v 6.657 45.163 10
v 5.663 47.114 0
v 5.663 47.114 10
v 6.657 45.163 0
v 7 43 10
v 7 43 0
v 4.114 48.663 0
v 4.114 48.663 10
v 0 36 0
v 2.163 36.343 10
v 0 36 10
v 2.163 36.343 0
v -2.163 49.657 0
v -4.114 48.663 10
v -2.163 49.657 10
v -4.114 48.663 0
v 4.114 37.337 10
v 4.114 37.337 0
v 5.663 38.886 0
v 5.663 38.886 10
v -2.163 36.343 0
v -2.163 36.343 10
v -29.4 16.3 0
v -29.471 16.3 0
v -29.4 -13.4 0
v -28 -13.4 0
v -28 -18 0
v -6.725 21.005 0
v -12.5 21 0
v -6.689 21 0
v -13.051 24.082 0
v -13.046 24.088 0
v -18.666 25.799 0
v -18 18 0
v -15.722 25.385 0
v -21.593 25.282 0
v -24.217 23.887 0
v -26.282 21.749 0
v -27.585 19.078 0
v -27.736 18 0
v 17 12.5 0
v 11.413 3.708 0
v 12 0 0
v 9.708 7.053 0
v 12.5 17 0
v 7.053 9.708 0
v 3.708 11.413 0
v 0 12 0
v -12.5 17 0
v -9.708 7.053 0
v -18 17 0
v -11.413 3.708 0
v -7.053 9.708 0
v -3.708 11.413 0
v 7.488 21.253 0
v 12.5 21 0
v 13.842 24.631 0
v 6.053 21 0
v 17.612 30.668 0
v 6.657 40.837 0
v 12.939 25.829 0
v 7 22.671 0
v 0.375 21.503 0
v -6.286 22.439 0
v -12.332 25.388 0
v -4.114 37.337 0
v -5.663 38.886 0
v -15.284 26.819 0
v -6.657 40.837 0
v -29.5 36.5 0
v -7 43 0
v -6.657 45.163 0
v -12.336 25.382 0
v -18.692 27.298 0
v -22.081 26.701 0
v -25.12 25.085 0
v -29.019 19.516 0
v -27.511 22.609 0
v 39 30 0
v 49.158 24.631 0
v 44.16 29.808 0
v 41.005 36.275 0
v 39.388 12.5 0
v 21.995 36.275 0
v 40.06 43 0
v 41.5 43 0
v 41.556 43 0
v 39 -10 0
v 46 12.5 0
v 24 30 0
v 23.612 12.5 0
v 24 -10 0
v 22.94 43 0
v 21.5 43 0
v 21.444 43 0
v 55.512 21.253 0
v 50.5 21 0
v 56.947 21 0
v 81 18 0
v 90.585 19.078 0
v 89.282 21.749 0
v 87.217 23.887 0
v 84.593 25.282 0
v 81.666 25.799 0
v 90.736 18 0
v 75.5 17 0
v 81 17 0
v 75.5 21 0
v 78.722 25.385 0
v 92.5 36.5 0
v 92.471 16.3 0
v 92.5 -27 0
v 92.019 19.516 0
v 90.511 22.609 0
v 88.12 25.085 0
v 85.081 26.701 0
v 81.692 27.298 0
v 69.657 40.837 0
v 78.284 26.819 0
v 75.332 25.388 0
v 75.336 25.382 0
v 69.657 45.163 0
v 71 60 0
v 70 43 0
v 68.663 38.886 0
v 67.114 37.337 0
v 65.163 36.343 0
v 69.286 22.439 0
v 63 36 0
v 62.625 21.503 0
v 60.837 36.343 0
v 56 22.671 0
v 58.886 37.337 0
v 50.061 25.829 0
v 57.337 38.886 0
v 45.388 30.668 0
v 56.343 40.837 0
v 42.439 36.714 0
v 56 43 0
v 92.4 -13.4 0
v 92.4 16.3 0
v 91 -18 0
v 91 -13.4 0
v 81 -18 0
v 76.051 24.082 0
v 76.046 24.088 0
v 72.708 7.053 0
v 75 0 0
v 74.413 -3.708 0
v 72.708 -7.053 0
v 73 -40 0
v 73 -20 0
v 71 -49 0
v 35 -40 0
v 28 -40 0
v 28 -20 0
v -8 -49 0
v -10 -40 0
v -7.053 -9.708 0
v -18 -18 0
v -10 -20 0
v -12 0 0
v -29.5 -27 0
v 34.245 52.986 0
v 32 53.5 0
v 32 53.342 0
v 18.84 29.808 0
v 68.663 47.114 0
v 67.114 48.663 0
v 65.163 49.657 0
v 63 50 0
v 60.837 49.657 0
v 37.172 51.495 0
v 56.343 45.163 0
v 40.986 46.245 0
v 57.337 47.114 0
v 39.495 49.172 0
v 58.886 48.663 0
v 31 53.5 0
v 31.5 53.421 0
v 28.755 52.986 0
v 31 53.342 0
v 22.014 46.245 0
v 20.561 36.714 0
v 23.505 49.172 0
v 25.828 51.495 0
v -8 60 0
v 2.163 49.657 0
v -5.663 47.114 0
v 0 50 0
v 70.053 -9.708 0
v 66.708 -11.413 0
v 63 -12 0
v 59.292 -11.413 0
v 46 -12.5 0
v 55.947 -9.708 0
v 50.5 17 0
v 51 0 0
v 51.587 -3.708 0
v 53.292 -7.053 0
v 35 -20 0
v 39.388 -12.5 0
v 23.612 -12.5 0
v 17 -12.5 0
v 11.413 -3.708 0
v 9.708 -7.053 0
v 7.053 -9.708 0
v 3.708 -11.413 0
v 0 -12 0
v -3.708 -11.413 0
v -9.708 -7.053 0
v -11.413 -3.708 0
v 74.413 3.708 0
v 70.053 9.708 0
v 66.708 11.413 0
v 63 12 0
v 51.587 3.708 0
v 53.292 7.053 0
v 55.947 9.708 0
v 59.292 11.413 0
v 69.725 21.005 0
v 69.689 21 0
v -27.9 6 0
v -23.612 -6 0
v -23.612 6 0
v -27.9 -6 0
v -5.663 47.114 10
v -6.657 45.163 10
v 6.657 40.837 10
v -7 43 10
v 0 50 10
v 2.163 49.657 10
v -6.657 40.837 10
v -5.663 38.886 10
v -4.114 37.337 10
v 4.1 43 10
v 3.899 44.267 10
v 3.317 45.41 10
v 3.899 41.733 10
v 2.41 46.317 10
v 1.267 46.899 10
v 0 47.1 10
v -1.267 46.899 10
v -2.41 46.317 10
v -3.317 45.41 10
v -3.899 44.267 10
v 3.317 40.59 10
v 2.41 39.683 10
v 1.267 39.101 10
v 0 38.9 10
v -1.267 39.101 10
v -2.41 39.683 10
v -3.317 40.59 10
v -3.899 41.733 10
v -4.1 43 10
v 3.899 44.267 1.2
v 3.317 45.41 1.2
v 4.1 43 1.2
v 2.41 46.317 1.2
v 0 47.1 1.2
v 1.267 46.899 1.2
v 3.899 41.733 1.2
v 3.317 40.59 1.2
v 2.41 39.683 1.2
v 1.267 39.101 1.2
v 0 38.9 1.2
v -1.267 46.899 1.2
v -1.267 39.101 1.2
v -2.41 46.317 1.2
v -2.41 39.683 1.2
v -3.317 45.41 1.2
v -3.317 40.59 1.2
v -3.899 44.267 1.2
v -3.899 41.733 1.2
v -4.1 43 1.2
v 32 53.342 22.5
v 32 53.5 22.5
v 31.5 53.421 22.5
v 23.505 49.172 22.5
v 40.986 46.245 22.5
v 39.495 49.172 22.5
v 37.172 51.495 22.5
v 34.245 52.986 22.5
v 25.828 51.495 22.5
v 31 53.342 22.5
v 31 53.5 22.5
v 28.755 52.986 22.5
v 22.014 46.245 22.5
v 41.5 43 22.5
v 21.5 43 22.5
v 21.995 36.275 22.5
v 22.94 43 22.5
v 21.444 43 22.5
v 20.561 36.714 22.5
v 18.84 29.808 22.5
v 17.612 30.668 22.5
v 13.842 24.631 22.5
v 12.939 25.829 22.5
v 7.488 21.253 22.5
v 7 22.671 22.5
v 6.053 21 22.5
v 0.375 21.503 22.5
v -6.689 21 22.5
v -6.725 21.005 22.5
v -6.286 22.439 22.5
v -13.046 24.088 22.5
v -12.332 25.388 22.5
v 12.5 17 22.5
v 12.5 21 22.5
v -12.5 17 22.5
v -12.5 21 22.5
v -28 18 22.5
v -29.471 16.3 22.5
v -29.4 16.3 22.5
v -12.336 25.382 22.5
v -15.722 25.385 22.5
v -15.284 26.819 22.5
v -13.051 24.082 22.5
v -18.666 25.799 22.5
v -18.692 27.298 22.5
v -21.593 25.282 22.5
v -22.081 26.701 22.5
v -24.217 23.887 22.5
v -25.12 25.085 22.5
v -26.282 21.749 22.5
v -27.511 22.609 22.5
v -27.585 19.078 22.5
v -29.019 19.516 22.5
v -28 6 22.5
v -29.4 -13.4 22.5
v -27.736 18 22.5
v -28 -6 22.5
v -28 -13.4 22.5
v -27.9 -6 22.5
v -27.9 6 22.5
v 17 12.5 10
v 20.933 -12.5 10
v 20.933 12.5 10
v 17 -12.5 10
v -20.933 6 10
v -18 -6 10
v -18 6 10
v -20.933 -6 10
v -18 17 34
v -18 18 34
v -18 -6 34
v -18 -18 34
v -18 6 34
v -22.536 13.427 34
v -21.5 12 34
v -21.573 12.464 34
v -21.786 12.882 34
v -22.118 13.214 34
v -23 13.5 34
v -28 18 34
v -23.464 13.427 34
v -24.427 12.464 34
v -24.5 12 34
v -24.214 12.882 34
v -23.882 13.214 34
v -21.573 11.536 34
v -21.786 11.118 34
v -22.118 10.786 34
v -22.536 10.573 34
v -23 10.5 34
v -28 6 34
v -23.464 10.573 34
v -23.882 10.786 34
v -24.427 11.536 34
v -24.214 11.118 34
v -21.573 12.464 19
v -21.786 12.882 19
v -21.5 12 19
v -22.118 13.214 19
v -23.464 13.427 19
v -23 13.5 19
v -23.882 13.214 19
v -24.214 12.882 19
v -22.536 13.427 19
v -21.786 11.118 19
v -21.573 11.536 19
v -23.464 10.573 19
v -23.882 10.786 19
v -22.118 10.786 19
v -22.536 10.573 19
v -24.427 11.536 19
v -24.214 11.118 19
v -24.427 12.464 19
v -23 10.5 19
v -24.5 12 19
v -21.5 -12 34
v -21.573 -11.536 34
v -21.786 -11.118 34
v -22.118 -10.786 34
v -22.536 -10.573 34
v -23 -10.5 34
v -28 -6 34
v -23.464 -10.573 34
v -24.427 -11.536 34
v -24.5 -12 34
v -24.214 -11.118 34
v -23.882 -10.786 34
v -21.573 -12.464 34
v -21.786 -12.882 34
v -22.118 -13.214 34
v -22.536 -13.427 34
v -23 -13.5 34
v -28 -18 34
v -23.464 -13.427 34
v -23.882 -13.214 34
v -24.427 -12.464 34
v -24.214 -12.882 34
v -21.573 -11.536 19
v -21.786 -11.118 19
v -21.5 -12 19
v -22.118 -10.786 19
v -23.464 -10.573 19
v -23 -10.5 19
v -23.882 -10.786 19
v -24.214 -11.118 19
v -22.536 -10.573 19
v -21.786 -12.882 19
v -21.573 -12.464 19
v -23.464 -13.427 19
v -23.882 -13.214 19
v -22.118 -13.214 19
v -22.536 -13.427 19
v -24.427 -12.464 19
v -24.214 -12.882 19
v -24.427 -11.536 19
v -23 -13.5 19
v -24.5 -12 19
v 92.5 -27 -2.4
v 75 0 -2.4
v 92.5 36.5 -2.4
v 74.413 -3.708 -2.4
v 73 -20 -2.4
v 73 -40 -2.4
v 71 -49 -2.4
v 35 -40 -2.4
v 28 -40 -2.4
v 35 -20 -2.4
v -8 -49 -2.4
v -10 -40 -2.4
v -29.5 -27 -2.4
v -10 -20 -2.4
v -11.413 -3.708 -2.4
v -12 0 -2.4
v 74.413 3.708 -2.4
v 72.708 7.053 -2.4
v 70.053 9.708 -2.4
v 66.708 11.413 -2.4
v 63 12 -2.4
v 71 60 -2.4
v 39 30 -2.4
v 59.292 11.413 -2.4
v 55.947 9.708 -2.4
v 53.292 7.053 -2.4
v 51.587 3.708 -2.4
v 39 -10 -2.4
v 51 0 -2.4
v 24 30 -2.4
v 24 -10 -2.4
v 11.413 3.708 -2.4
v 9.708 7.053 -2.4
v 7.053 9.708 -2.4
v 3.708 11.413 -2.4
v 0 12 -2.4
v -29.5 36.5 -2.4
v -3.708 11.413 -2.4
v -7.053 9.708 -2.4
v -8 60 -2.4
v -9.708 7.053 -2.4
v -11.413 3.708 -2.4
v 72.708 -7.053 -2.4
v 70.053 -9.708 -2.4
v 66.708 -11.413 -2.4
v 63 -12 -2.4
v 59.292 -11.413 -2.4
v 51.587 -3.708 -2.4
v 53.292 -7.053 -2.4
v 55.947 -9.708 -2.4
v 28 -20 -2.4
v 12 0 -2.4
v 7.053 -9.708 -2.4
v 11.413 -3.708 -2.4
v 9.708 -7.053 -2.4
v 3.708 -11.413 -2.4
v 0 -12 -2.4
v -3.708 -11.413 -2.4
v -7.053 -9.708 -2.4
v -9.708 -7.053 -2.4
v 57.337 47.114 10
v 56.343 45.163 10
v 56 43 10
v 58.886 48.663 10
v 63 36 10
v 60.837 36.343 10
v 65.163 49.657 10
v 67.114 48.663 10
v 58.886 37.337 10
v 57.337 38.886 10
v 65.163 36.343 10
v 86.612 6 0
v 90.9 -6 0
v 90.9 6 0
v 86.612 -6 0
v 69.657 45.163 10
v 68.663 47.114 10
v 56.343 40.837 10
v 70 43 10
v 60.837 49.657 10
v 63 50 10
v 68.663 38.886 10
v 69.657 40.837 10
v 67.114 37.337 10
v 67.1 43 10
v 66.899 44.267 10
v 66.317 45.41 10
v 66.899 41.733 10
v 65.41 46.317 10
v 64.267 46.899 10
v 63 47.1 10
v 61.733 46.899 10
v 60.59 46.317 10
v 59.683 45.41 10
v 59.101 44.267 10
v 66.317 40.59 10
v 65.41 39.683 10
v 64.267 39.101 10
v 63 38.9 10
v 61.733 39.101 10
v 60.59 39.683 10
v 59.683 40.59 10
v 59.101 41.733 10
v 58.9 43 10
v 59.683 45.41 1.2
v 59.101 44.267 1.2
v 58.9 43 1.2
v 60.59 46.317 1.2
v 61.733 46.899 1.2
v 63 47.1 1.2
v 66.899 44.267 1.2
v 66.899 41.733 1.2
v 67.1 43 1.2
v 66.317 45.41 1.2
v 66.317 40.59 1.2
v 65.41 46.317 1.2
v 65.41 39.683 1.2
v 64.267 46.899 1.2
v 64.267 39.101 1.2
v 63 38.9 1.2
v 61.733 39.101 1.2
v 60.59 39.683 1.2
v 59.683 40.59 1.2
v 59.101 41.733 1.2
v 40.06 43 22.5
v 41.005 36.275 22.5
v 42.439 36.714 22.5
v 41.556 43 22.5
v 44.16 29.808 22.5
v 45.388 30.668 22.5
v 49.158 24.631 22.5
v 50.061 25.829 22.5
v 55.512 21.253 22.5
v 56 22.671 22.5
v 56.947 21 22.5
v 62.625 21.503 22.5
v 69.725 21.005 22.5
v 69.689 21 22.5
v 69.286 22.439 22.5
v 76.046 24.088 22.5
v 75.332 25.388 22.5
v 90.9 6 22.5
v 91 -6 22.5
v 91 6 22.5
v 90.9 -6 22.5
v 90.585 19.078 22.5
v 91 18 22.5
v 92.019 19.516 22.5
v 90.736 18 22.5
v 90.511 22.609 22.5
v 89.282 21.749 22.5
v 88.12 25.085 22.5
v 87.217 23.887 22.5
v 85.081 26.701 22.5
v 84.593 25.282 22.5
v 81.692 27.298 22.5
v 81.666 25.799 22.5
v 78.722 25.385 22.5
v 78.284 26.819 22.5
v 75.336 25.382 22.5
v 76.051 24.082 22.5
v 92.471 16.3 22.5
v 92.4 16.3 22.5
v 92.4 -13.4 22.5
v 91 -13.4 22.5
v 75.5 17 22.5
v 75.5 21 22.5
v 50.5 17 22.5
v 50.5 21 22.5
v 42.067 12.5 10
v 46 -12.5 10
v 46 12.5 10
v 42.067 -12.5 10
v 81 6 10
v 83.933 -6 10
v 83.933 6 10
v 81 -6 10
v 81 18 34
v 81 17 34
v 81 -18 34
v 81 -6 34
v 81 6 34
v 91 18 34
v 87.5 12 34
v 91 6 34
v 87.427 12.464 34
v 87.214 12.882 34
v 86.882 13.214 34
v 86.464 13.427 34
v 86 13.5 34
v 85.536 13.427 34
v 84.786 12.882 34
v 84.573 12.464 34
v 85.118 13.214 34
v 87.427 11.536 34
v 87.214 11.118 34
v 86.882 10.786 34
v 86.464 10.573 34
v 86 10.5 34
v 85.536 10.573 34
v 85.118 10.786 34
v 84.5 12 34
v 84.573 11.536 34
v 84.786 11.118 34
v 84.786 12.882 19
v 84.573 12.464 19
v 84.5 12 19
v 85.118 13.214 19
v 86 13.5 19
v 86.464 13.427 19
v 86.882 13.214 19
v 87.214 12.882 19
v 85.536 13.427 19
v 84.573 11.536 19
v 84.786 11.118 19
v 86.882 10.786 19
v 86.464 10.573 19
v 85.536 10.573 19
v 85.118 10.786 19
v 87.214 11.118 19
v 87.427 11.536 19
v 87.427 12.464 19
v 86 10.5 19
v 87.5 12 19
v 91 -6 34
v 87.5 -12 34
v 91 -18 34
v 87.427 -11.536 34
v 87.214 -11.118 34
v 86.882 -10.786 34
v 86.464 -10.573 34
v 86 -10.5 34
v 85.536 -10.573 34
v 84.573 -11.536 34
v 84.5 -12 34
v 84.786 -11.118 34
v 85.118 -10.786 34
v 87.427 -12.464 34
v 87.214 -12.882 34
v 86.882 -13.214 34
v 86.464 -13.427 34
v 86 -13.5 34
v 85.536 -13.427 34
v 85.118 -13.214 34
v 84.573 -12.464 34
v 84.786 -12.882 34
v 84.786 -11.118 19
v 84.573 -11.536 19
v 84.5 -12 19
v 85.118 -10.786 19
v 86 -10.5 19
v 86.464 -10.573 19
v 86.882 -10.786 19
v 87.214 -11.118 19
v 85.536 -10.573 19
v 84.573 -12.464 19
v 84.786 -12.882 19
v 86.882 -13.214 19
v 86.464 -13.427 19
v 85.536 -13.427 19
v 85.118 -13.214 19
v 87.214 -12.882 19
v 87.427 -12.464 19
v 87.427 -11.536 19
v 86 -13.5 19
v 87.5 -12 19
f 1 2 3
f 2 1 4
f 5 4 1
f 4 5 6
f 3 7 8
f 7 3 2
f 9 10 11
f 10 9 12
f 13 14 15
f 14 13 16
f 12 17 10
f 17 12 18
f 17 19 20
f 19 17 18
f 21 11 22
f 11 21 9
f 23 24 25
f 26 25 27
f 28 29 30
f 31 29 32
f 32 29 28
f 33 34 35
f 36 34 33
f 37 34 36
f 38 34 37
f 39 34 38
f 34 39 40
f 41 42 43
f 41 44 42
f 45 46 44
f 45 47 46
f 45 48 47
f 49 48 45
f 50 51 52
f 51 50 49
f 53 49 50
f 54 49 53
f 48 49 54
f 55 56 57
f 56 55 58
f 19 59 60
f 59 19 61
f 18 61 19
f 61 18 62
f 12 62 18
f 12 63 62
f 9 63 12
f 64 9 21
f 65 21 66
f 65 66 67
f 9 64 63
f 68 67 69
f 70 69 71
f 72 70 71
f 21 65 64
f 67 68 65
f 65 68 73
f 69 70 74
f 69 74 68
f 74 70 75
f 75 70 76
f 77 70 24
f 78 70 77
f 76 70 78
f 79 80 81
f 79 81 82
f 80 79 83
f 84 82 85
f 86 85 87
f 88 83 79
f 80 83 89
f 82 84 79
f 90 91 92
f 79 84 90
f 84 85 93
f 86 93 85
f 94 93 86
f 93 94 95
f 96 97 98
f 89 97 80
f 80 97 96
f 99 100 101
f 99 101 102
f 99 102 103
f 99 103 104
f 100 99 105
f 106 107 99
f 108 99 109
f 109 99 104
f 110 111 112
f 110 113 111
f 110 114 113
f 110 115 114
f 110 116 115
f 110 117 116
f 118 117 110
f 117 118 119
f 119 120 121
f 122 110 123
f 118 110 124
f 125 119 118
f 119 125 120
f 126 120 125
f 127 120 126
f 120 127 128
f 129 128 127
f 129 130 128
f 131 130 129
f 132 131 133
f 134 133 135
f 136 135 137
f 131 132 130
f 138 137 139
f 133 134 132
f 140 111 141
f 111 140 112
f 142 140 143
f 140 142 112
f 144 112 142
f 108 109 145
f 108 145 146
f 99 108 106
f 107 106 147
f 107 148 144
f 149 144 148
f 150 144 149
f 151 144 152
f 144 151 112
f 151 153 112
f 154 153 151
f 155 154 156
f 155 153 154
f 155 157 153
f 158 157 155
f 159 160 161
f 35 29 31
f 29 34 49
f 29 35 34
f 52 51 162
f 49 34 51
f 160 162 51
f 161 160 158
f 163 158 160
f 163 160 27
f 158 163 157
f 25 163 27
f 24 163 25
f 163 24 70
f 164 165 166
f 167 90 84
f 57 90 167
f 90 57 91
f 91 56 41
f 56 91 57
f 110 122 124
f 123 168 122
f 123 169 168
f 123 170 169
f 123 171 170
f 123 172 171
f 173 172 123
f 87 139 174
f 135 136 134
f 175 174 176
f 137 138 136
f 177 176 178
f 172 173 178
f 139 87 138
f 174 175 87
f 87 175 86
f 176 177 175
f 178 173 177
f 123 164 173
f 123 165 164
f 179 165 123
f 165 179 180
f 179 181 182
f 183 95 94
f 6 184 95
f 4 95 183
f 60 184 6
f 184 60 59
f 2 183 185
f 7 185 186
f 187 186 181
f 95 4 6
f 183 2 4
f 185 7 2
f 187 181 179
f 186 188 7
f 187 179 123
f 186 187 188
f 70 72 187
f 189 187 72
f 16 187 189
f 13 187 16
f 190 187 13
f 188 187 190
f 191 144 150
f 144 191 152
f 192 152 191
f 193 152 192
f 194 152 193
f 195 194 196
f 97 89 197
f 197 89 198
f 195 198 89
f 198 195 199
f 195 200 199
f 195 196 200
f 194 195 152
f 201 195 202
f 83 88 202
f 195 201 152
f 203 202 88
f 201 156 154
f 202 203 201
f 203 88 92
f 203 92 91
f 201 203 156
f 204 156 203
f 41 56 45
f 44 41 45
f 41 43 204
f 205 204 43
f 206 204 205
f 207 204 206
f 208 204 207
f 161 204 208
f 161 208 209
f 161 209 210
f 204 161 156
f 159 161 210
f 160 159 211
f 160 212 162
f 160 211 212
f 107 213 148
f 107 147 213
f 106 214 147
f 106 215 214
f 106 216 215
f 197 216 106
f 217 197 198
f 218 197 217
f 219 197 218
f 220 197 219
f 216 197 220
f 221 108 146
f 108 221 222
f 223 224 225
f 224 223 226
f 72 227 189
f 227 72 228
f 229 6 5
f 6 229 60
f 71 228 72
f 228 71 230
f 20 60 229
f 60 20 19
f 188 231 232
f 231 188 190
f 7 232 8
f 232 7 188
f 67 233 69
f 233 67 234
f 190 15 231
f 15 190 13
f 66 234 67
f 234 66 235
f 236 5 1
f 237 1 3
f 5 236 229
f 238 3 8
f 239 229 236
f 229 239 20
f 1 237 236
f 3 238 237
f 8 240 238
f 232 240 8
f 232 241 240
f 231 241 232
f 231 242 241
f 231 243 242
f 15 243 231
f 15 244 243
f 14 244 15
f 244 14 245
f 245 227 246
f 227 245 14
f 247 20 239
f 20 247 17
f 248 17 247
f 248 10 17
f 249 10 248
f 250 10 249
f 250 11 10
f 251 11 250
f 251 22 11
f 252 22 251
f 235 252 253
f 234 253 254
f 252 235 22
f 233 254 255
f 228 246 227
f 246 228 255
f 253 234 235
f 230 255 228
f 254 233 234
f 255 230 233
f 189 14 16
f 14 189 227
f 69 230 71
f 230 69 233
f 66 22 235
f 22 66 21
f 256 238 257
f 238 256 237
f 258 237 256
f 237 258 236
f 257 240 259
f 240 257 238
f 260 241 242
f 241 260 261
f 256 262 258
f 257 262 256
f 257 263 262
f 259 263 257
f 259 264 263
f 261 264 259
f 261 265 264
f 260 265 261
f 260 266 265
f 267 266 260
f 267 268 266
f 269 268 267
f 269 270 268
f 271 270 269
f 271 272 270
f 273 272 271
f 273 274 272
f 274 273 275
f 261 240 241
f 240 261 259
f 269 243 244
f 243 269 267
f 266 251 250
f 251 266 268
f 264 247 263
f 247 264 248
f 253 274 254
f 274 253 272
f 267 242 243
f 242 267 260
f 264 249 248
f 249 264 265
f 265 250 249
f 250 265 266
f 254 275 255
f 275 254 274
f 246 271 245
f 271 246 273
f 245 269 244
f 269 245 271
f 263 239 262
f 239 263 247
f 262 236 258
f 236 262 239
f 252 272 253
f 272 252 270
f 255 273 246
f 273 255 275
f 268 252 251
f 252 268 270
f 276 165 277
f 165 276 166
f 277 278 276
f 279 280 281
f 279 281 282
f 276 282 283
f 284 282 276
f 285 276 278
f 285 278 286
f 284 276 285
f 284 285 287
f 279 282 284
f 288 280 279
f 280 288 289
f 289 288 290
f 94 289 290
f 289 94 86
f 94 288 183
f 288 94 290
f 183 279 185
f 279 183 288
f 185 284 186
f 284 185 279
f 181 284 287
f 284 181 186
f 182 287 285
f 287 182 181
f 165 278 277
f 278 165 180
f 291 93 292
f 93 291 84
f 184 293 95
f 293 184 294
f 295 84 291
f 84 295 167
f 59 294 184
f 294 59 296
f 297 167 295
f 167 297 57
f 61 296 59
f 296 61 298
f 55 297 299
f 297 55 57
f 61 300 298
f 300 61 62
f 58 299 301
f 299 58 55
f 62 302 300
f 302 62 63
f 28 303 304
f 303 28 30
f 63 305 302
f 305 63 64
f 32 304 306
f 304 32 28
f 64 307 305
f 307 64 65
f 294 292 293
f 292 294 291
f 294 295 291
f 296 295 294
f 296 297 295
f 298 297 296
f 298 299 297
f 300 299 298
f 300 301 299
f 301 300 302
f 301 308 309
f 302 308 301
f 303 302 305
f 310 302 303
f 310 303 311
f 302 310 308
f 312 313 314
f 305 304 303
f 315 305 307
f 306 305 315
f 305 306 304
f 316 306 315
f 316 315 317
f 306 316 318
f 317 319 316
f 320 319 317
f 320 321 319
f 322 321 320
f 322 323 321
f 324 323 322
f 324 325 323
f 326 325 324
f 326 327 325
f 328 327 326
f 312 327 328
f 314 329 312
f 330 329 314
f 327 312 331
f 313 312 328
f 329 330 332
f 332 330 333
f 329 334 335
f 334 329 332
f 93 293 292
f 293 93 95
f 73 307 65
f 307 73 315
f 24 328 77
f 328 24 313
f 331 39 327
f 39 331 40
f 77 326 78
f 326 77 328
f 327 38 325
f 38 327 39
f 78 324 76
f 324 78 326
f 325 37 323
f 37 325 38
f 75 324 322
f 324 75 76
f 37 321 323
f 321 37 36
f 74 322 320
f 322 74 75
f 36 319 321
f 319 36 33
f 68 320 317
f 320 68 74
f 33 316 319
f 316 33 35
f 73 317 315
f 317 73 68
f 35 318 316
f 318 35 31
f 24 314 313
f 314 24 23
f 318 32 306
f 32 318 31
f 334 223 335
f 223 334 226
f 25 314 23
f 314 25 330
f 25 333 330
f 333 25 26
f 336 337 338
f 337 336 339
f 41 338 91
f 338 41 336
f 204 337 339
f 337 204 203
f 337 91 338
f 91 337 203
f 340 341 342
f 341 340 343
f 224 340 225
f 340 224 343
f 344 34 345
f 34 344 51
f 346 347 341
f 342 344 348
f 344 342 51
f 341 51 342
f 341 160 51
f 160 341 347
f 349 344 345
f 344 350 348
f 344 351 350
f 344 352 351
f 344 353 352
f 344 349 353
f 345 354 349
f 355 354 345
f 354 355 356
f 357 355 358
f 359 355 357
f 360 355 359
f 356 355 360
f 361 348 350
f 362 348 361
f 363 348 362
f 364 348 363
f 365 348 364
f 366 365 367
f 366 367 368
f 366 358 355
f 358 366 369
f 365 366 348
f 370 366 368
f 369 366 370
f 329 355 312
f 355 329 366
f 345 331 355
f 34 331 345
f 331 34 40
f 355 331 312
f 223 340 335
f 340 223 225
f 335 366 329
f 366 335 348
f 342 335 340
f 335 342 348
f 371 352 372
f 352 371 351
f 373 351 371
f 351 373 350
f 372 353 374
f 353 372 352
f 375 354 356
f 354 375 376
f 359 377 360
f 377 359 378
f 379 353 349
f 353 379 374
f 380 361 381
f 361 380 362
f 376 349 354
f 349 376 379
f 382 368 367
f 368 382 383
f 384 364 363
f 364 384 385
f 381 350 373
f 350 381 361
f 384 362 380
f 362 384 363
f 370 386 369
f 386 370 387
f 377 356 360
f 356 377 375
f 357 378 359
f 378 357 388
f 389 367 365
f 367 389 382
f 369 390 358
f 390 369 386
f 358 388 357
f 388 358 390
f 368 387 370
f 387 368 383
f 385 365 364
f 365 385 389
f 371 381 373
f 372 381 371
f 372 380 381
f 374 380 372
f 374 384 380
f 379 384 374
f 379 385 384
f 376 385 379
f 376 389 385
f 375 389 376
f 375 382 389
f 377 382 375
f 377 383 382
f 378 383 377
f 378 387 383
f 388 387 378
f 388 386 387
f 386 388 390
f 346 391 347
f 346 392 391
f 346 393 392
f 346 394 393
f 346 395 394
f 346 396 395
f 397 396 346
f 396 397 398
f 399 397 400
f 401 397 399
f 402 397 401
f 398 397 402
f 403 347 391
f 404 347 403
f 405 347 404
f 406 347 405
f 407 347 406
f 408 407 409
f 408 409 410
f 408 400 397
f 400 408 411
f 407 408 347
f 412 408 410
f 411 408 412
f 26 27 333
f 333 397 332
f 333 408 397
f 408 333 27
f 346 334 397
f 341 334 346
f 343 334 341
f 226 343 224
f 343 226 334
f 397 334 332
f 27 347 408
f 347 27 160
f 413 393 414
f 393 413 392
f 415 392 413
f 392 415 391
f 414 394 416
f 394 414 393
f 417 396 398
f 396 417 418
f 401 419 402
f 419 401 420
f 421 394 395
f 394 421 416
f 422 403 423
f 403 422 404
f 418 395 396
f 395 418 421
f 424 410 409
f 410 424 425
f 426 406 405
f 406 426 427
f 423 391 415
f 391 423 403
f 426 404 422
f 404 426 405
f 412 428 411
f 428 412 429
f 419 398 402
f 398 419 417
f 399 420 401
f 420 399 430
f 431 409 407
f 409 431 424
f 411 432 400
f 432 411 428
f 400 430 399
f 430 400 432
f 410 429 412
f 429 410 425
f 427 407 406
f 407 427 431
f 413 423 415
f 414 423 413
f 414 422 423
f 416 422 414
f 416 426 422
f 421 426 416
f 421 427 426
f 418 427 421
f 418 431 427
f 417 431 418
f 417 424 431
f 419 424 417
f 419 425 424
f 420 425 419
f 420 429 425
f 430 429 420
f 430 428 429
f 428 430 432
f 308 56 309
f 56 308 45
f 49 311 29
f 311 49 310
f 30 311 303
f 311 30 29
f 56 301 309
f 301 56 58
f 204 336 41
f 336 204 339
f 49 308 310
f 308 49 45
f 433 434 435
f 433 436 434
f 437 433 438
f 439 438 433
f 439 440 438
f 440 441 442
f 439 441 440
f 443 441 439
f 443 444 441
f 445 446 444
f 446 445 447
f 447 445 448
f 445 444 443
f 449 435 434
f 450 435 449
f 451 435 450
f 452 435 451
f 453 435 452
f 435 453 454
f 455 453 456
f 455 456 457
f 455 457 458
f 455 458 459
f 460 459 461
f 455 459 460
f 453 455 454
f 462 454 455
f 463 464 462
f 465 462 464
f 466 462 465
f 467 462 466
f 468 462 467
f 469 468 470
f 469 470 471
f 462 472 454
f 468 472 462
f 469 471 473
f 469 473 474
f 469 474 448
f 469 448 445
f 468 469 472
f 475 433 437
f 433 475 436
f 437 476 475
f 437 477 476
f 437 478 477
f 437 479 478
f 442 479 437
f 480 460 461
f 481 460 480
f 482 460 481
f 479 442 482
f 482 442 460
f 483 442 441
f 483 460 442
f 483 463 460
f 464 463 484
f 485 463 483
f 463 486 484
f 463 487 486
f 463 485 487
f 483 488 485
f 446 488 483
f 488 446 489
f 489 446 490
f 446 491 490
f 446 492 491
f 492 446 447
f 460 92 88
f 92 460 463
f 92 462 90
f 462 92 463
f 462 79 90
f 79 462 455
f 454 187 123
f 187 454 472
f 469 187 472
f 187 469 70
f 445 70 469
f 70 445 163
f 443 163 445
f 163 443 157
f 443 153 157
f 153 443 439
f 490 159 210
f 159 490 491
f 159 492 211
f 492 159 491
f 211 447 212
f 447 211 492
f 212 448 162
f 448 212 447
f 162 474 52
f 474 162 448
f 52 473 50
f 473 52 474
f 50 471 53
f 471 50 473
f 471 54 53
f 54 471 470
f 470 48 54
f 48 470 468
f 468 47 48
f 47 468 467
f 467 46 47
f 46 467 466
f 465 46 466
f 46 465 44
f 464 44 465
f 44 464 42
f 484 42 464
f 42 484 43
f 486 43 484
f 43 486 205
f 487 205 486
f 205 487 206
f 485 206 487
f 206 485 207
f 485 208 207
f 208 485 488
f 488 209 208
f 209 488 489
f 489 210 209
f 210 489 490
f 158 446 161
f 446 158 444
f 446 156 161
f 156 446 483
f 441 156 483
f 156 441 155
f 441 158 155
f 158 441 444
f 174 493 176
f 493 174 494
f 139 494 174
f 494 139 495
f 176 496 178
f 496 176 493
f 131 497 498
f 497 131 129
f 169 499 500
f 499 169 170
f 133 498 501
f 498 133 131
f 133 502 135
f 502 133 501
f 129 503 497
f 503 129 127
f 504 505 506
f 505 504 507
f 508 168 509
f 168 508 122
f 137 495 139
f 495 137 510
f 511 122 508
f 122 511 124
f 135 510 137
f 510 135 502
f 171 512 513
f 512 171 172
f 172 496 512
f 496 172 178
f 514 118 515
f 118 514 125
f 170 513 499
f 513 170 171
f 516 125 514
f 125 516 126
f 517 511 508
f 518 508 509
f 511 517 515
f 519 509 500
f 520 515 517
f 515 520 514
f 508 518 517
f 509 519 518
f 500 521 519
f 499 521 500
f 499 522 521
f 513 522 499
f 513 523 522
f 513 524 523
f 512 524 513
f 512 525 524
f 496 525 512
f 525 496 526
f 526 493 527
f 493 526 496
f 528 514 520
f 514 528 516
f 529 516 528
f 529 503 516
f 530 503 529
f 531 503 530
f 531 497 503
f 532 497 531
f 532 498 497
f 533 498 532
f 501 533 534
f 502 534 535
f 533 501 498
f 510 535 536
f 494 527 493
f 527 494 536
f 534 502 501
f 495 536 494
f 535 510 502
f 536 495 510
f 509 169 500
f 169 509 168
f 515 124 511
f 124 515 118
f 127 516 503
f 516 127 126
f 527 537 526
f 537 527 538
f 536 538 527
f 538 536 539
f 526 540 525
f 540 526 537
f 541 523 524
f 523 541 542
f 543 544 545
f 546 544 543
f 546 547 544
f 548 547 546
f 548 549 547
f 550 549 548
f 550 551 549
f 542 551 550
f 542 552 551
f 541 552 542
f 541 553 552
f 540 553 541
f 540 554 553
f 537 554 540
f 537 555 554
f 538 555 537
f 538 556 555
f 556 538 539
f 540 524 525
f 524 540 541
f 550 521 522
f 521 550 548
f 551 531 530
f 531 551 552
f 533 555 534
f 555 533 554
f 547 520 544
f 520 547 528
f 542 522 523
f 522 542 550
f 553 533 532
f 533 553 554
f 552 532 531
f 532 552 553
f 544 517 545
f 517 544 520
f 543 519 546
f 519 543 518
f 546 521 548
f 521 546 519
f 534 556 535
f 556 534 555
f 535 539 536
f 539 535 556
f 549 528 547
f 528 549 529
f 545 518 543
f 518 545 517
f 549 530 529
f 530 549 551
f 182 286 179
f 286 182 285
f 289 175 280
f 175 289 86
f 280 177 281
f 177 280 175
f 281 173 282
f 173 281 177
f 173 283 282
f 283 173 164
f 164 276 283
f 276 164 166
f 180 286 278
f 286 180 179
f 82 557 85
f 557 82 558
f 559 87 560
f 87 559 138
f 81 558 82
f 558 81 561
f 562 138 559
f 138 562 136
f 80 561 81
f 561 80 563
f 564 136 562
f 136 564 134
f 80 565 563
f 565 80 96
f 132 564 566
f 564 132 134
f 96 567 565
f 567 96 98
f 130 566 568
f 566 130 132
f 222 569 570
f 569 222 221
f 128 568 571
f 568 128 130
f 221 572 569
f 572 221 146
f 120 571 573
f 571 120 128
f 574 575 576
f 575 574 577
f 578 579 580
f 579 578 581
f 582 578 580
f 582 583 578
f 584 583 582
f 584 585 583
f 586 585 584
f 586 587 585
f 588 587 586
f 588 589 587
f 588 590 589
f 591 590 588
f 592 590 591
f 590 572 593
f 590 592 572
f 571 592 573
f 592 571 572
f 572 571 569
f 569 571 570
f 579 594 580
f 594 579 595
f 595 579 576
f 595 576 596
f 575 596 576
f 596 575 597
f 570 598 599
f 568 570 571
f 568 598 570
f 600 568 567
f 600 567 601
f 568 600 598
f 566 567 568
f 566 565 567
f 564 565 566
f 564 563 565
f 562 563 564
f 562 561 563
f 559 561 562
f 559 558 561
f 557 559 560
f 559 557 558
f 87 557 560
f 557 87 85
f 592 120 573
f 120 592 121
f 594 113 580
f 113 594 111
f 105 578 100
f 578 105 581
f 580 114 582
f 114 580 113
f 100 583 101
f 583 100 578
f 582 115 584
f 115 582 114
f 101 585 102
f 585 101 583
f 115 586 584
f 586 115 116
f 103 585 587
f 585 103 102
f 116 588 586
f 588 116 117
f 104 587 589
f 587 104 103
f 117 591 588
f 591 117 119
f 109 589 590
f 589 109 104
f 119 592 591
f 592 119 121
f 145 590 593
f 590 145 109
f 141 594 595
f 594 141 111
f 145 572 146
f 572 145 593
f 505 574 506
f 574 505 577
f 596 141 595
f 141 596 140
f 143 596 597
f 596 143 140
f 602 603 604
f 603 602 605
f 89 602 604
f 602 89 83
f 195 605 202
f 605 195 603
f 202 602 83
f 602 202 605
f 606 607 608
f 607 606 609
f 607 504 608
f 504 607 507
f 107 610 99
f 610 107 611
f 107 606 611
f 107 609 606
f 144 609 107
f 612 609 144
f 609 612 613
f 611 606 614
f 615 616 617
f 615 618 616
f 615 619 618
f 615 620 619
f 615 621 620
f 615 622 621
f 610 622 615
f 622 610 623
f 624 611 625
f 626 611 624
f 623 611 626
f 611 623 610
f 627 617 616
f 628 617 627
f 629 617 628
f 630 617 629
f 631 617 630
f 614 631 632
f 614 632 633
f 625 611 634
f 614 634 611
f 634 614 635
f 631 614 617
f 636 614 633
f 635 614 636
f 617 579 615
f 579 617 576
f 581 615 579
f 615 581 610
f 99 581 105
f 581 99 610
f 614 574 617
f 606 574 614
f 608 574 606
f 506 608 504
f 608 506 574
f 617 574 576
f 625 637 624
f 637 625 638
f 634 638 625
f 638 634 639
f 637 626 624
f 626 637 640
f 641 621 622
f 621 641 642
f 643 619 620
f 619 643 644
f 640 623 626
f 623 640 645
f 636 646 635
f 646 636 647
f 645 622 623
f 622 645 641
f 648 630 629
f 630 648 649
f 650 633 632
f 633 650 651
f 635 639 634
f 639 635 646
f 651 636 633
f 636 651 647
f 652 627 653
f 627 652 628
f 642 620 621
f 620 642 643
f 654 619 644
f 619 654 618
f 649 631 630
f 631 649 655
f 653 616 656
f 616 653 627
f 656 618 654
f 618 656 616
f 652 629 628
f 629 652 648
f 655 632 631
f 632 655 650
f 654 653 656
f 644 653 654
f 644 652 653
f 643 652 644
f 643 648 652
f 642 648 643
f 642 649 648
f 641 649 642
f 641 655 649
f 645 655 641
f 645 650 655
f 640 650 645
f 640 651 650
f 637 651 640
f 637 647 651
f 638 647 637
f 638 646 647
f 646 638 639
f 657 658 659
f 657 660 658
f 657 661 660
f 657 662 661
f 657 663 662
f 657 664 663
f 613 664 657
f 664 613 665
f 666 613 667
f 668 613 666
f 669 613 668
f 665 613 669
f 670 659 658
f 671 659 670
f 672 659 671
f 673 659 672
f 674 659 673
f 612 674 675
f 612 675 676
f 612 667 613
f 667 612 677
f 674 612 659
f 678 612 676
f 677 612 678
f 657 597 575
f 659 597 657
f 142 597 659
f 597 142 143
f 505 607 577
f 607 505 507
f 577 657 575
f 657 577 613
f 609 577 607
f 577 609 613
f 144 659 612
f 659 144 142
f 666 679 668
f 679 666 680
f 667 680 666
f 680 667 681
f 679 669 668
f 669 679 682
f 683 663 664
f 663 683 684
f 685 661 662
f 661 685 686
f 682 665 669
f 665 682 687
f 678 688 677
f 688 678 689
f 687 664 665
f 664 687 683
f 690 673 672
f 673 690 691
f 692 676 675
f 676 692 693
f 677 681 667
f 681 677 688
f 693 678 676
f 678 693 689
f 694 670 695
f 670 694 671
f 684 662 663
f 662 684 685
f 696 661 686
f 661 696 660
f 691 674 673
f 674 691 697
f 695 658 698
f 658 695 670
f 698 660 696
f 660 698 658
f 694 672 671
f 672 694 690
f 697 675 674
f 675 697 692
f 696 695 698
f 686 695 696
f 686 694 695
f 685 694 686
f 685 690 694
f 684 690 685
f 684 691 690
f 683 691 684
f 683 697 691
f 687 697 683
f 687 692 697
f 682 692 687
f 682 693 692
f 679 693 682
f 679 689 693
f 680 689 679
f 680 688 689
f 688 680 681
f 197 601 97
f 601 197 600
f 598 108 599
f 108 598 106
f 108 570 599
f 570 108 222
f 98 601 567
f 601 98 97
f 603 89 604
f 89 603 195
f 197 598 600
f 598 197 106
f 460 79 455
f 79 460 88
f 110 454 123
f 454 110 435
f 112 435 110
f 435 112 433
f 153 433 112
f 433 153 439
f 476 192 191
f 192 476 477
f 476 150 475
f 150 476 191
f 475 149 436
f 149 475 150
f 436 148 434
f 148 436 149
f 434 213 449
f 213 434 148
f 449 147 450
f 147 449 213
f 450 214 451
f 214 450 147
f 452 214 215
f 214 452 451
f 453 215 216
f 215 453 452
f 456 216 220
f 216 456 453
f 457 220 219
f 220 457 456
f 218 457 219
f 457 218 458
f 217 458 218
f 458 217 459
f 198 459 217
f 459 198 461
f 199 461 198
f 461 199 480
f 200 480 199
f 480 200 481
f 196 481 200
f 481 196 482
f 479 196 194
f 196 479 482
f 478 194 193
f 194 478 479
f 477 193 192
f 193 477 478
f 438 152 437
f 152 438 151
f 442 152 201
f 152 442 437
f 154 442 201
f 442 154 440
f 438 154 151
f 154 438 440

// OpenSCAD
// file: common.scad
use <common.scad>

$fn=20;

nema14(true);
module nema14(with_screws = false){
	cylinder(r=2.5, h=54);
	cylinder(r=11.3, h=36);
	translate([-18, -18, 0]) cube([35, 35, 34]);
	if(with_screws){
		translate([13, 13, 34]) cylinder(r=1.55, h=10);
		translate([-13, 13, 34]) cylinder(r=1.55, h=10);
		translate([13, -13, 34]) cylinder(r=1.55, h=10);
		translate([-13, -13, 34]) cylinder(r=1.55, h=10);
	}
}

module nema17(with_screws = false){
	cylinder(r=2.5, h=34+24);
	cylinder(r=11.3, h=34+2);
	translate([-21, -21, 0]) cube([42.3, 42.3, 34]);
	if(with_screws){
		translate([15.5, 15.5, 34]) cylinder(r=1.55, h=10);
		translate([-15.5, 15.5, 34]) cylinder(r=1.55, h=10);
		translate([15.5, -15.5, 34]) cylinder(r=1.55, h=10);
		translate([-15.5, -15.5, 34]) cylinder(r=1.55, h=10);
	}
}

module semiarc(r, h, weight, angle_start, angle_finish){
	angle = angle_finish - angle_start;
	distance=(r+weight)*1.5;

	rotate([0, 0, angle_start])
	intersection(){
		rotate_extrude(convexity = 10)
		translate([r, 0, 0]) square([weight,h]);
		if(angle<360){
			linear_extrude(height=h)
			if(angle>180){
				polygon(points=[[0,0], 
				[distance,0],
				[0, distance],
				[-distance, 0],
				[0, -distance],
				[distance*cos(angle), distance*sin(angle)]
				]);
			}else{
				polygon(points=[[0,0], 
				[distance,0],
				[0, distance],
				[distance*cos(angle), distance*sin(angle)]
				]);
			}
		}
	}
}

	
// file: pulley.scad
//$fn=20;
M_PI=3.14159265359;

ball_diameter=4.5+0.5;
ball_distance=12-0.4; // center to center
thread_diameter=2+0.5;

/*
sphere(r=ball_diameter/2);
cylinder(r=thread_diameter/2, h=ball_distance);
translate([0,0,ball_distance]) sphere(r=ball_diameter/2);
*/

ball_radius=ball_diameter/2;
thread_radius=thread_diameter/2;

motor_thickness=5.2;

ball_bearing_height = 7 + 0.2;
ball_bearing_diameter = 22 + 0.5;
pulley_thickness = ball_diameter+2.5;
pulley1_ball_bearing_height = pulley_thickness/2-0.9;
echo("pulley1_ball_bearing_height",pulley1_ball_bearing_height);

pulley2_ball_bearing_height = ball_bearing_height-pulley1_ball_bearing_height;

ball_count = 12;

difference(){
  half_pulley(ball_count, pulley_thickness);
  translate([0,0,-pulley_thickness/2]) cylinder(d=18, h=pulley_thickness/2); //ball bearing
  translate([0,0,-pulley1_ball_bearing_height]) cylinder(d=ball_bearing_diameter, h=pulley1_ball_bearing_height); //ball bearing
  
  for ( i = [0 : 2] ){ // screw hole with head
    rotate([0,0,75+120*i]) translate([15.5, 0, -pulley_thickness/2]) color("blue") 
      union(){
        cylinder(d=3, h=pulley_thickness);
        cylinder(d=5.7, h=pulley_thickness/4);
      }
  }
}

translate([pulley_radius(ball_count)*2.5,0])
difference(){
  half_pulley(ball_count, pulley_thickness);
  translate([0,0,-pulley_thickness/2]) cylinder(d=15, h=pulley_thickness/2); //ball bearing
  translate([0,0,-pulley2_ball_bearing_height]) cylinder(d=ball_bearing_diameter, h=pulley2_ball_bearing_height); //ball bearing
  for ( i = [0 : 2] ){ // screw hole
    rotate([0,0,75+120*i]) translate([15.5, 0, -pulley_thickness/2]) color("blue") 
      union(){
        cylinder(d=3, h=pulley_thickness);
      }
  }
}


function pulley_external_radius(ball_count) = pulley_radius(ball_count)+ball_diameter/2;
function pulley_radius(ball_count) = ball_count*ball_distance/(2*M_PI);
function ball_diameter() = ball_diameter;

module half_pulley(ball_count, thickness){
  echo("Generating pulley for ", ball_count, " balls");
  perimeter=ball_count*ball_distance;
  radius=perimeter/(2*M_PI);
  external_radius=radius+ball_diameter/2;
  echo("  Calculated perimeter", perimeter);
  echo("  Calculated radius", radius);
  ring_width=radius*0.2;
    angle = 360/ball_count;

  direct_ball_distance = radius*sqrt( pow(sin(angle),2) + pow(1-cos(angle),2));
  alpha = asin(((1-cos(angle))*radius)/direct_ball_distance);
  echo("  Calculated alpha", alpha);

    if(abs(radius-sin(alpha)*direct_ball_distance + cos(angle)*radius)>0.1)
    echo ("---------------- ERROR CALCULATING ANGLE -------------------------");
/*
color("violet")
translate([0,0,-thickness/2])
linear_extrude(height=thickness/2, convexity = 10) 
                polygon(points=[[radius, 0], 
                      [radius, direct_ball_distance*cos(alpha)],
                      [radius -(direct_ball_distance*sin(alpha)), direct_ball_distance*cos(alpha)]]);
*/
  difference(){
    union(){ // MAIN CYLINDER
      difference(){
        translate([0,0,-thickness/2]) cylinder(r=external_radius, h=thickness/2);
        color("blue") translate([0,0,-thickness/2]) cylinder(r=motor_thickness/2, h=10);
      }
    }
    union(){ // EXTRACT MATERIAL FOR BALLS AND THREAD
      //// thread_indent
      union(){
      rotate_extrude(convexity = 10)
        hull(){
          translate([radius, 0, 0]) circle(d=thread_diameter);
          translate([external_radius, 0, 0]) circle(d=thread_diameter);
        }
        color("red") translate([0,0,- thread_radius])rotate([180,0,0])cylinder_round(external_radius, 0.5, 0.5);
      }
      //// ball_indent
      //for ( i = [0 : 0] )
      //  rotate([0,0,i*360/ball_count]) translate([radius, 0, 0]) color("blue")
      //    sphere(r=ball_radius);
      
      //// ball_ways
      difference(){
        for ( i = [0 : ball_count-1] )
        hull(){
          // half 1
          rotate([0,0,i*angle]) translate([radius, 0, 0]) 
          color("red")
           union() {
             translate([-(direct_ball_distance*sin(alpha)), direct_ball_distance*cos(alpha)])
              sphere(r=ball_radius);
            intersection() {
              rotate_extrude(convexity = 10) translate([direct_ball_distance, 0, 0]) 
                circle(r=ball_radius);
              translate([0,0,-thickness/2])
               linear_extrude(height=thickness) 
                polygon(points=[[0, 0], 
                      [cos(angle)*external_radius*1.5-radius, sin(angle)*external_radius*1.5],
                      [-(direct_ball_distance*sin(alpha)), direct_ball_distance*cos(alpha)]]);
            }//intersection
          }//union

        // half 2
          rotate([0,0,((i + 2) % ball_count)*angle]) translate([radius, 0, 0]) 
          color("yellow")
           union() {
             translate([-(direct_ball_distance*sin(alpha)), -direct_ball_distance*cos(alpha)])
              sphere(r=ball_radius);
            intersection() {
              rotate_extrude(convexity = 10) translate([direct_ball_distance, 0, 0]) 
                circle(r=ball_radius);
              translate([0,0,-thickness/2])
               linear_extrude(height=thickness) 
                polygon(points=[[0, 0], 
                      [cos(angle)*external_radius*1.5-radius, -sin(angle)*external_radius*1.5],
                      [-(direct_ball_distance*sin(alpha)), -direct_ball_distance*cos(alpha)]]);
            }//intersection
          }//union
        } //hull
      }//difference
    }//union

  }//difference

}//module








//////////// B A S I C   P U L L E Y /////////////
module basic_pulley(ball_count){
  echo("Generating pulley for ", ball_count, " balls");
  perimeter=ball_count*ball_distance;
  radius=perimeter/(2*M_PI);
  external_radius=radius+ball_diameter/6;
  echo("  Calculated perimeter", perimeter);
  echo("  Calculated radius", radius);
  thickness=ball_diameter+2;
  ring_width=radius*0.2;

  difference(){
    union(){ // MAIN CYLINDER
      difference(){
        translate([0,0,-thickness/2]) 
        cylinder(r=external_radius, h=thickness);
        cylinder(r=radius-ring_width, h=thickness);
        translate([0,0,-thickness/2]) 
        cylinder(r=motor_thickness/2, h=10);
      }
      cylinder_round(radius-ring_width,thickness/2, 0);
      difference(){
        cylinder(r=7, h=3);
        cylinder(r=motor_thickness/2, h=10);
      }
    }
    union(){ // EXTRACT MATERIAL FOR BALLS AND THREAD
      rotate_extrude(convexity = 10)
      translate([radius, 0, 0])
        thread_hole(thread_radius, thickness, radius, external_radius);
      for ( i = [0 : ball_count-1] )
        rotate([0,0,i*360/ball_count]) translate([radius, 0, 0]) 
        union(){
          hull(){
            sphere(r=ball_radius);
            translate([3*(external_radius-radius), 0, 3*(external_radius-radius)])sphere(r=ball_radius);
          }
        }
    }
  }

}

module thread_hole(thread_radius, thickness, internal_radius, external_radius){
  point1=[-thread_radius*cos(45),thread_radius*sin(45)];
  y=thickness/2+0.1;
  point2=[point1[0]+y-point1[1],y];
  point3=[max(external_radius-internal_radius, point2[0]),-thread_radius];
  point4=[0, -thread_radius];
  points=[point1, point2, point3, point4];
    union(){
    circle(r=thread_radius, h=0);  
    polygon(points=points);
  }  
}

module cylinder_round(internal_radius, height, margin){
  delta_radius=height;
  rotate_extrude(convexity = 20)
  translate([internal_radius, 0, 0])rotate([90,0,0])rotate([0,180,0])
  difference() {
    translate([-margin, -margin, 0]) square(delta_radius + margin);
    translate([delta_radius,delta_radius,0]) circle(delta_radius);
  }
}
// main file
use <pulley.scad>
use <common.scad>
use <parametric_involute_gear_v5.0.scad>

$fn = 20;
hideDetails = false;
//pulley(10);
//echo("proba", pulley_radius(10), "  ");
/*
// TESTING BEVEL GEARS
difference(){
bevel_gear_pair(gear1_teeth = 21,
	gear2_teeth = 8,outside_circular_pitch=500, on_plate=true);
cube([100,100,25], center=true);
}
*/

//translate([50, 0, 0]) half_pulley(10, 7);
//translate([100, 0, 0]) half_pulley(8, 7);

teethL = 38;
teethS = 19;

pulley_thickness = 6.6;
ball_count = 10;

showL = false;
showS = false;
showHalfPulley = false;
showMain = true;

separated = true;

if(showL && showS){
	if(separated){
		translate([-50,0,0]) rotate([0,0,360/teethL/2]) WadesS();
	}else{
		translate([-45,0,0]) rotate([0,0,360/teethL/2]) WadesS();
	}
}else if(showS){
	WadesS();
}
if(showL){
	WadesL();
}
if(showHalfPulley){
	translate([0, 75,0])
	difference(){
	half_pulley(ball_count, pulley_thickness);
	translate([0, 0, -5])cylinder(r = 4.1, h = 80);
	  for ( i = [0 : 3] ){ // screw hole
	    rotate([0,0,90*i]) translate([11, 0, -pulley_thickness]) color("blue") 
	      union(){
	        cylinder(d=3, h=pulley_thickness);
			translate([0, 0, ])sphere(r=4);
	      }
	  }
	}
}
show_motors = false;
wall_thick = 1.5;
if(showMain){
half_chasis();
translate([63,0,0])mirror([1,0,0])half_chasis();
}


module half_chasis(){
	translate([0, 43, 0])
	union(){
		difference(){
			cylinder(r=7, h=10);
			translate([0, 0, 1.2])
			cylinder(r=4.1, h=16);
		}
		cylinder_round(-7, 4, 1);

		translate([32, 0, 0])
			intersection(){
				translate([-9, 0, 0])cube([9, 9, 22.5]);
				cylinder(r=9, h=22.5);
			}
		translate([32, 0, 0])
			semiarc(9, 22.5, wall_thick, 90, 180);
		semiarc(21.5, 22.5, wall_thick, 235, 360);
		translate([-18.5, -26.7, 0]) color("red")
			semiarc(9.5, 22.5, wall_thick, 55, 180);
		translate([-27.9-wall_thick, -26.4-30, 0])
			cube([wall_thick, 30, 22.5]);
	}
	if(show_motors){
	%	nema14();
	}
	color("blue")
	difference(){
	union(){
		translate([-12.5, 16, 0]) cube([25, 5, 22.5]);
		intersection(){
			translate([16,-12.5,  0])cube([8, 25, 10]);
			translate([16,-12.5, -2.5]) rotate([0, -15, 0])cube([8, 25, 15]);
		}
		mirror([1,0,0])
		intersection(){
			translate([16,-12.5,  0])cube([8, 25, 10]);
			translate([16,-12.5, -2.5]) rotate([0, -15, 0])cube([8, 25, 15]);
		}
		translate([-28, 6, 0]) 
		difference(){
			cube([10, 12, 34]);
			translate([5, 6, 19])cylinder(d=3, h=15);
		}
		translate([-28, -18, 0])
		difference(){
			cube([10, 12, 34]);
			translate([5, 6, 19])cylinder(d=3, h=15);
		}
	}
	nema14();
	}
// FONDO
	color("violet")
	translate([0, 0, -2.4])
	linear_extrude(height = 2.4)
	difference(){
		polygon(points=[
			[32, 60],
			[-8, 60],
			[-28-wall_thick, 36.5],
			[-28-wall_thick, -27],
			[-8, -49],
			[32, -49],
			[32, -10],
			[24, -10],
			[24, 30],
			[32, 30]
		]);
		circle(r=12);
		polygon(points=[
			[-10, -20],
			[-10, -40],
			[28, -40],
			[28, -20]
		]);
	}
}

module motor(){
	cylinder(r=2.5, h=54);
	cylinder(r=11.3, h=36);
	translate([-18, -18, 0]) cube([36, 36, 34]);
}
module WadesL(){
	twist = 160;
	pressure_angle = 30;
	pulleys_distance = 28;
	hole_radius = 6;

	//Large WADE's Gear
	difference(){
		union(){
			gear (number_of_teeth=teethL,
				circular_pitch=268,
				gear_thickness = 0,
				rim_thickness = 4,
				rim_width = 3,
				hub_thickness = 0,
				hub_diameter = 16,
				bore_diameter = 5.2,
				circles=6,
				pressure_angle=pressure_angle,
				twist=twist/teethL);
			mirror([0,0,1])
			gear (number_of_teeth=teethL,
				circular_pitch=268,
				gear_thickness = 4,
				rim_thickness = 4,
				rim_width = 3,
				hub_thickness = 0,
				hub_diameter = 16,
				bore_diameter = 5.2,
				circles=6,
				pressure_angle=pressure_angle,
				twist=twist/teethL);
			translate([0, 0, pulleys_distance]) half_pulley(ball_count, pulley_thickness);
		 	color("red") cylinder(r = 9, h = pulleys_distance);
			if(!hideDetails){
				cylinder_round(-9, 1, 1);
				cylinder_round(23.6, 1.6, 1.6);
			}
			translate([0, 0, pulleys_distance-3.3])
			difference(){
				rotate_extrude(convexity = 10) //ball pulley support
				polygon(points=[[0, 0],
					[pulley_external_radius(ball_count),0],
					[0, -pulley_external_radius(ball_count)*1.25]
				]);
				difference(){ // internal hole
					rotate_extrude(convexity = 10)
					translate([10, -6.5, 0]) rotate([0, 0, 45])
					square(4.5);
					cube([100, 2, 100], center=true);
					rotate([0, 0, 90]) cube([100, 2, 100], center=true);
				}
			}
		}
		union(){ // view inside% cube([200,200,200]);
			translate([0, 0, -5])cylinder(r = 4.1, h = 80);
			translate([0, 0, -4])
			rotate_extrude(convexity = 10)
			polygon(points=[[0, 0], 
				[0, 4+pulleys_distance],
				[hole_radius, 4+pulleys_distance-hole_radius*1.25],
				[hole_radius, hole_radius*1.25]
				]);
		}
		translate([0, 0, pulleys_distance])
  		for ( i = [0 : 3] ){ // screw hole
  		  rotate([0,0,90*i]) translate([11, 0, -pulley_thickness]) color("blue") 
      		union(){
        			cylinder(d=3, h=pulley_thickness);
     		}
  		}
	}
}

module WadesS(){
twist=200;
pressure_angle=30;
	//small WADE's Gear
	difference(){
	union(){
		gear (number_of_teeth=teethS,
			circular_pitch=268,
			gear_thickness = 5,
			rim_thickness = 5,
			hub_thickness = 11.5,
			hub_diameter = 20,
			bore_diameter = 5.4,
			circles=0,
			pressure_angle=pressure_angle,
			twist=twist/teethS);
		mirror([0,0,1])
		gear (number_of_teeth=teethS,
			circular_pitch=268,
			gear_thickness = 5,
			rim_thickness = 5,
			hub_thickness = 0,
			hub_diameter = 20,
			bore_diameter = 5.4,
			circles=0,
			pressure_angle=pressure_angle,
			twist=twist/teethS);
		
	}
	// screw
		translate([0,-5.4,10.5])cube([6,2.4,12.5],center = true);
		translate([0,0,8])rotate([0,90,-90])cylinder(r=1.6,h=20);
	}
}

module semiarc(r, h, weight, angle_start, angle_finish){
	angle = angle_finish - angle_start;
	distance=(r+weight)*1.5;

	rotate([0, 0, angle_start])
	intersection(){
		rotate_extrude(convexity = 10)
		translate([r, 0, 0]) square([weight,h]);
		if(angle<360){
			linear_extrude(height=h)
			if(angle>180){
				polygon(points=[[0,0], 
				[distance,0],
				[0, distance],
				[-distance, 0],
				[0, -distance],
				[distance*cos(angle), distance*sin(angle)]
				]);
			}else{
				polygon(points=[[0,0], 
				[distance,0],
				[0, distance],
				[distance*cos(angle), distance*sin(angle)]
				]);
			}
		}
	}
}

	
